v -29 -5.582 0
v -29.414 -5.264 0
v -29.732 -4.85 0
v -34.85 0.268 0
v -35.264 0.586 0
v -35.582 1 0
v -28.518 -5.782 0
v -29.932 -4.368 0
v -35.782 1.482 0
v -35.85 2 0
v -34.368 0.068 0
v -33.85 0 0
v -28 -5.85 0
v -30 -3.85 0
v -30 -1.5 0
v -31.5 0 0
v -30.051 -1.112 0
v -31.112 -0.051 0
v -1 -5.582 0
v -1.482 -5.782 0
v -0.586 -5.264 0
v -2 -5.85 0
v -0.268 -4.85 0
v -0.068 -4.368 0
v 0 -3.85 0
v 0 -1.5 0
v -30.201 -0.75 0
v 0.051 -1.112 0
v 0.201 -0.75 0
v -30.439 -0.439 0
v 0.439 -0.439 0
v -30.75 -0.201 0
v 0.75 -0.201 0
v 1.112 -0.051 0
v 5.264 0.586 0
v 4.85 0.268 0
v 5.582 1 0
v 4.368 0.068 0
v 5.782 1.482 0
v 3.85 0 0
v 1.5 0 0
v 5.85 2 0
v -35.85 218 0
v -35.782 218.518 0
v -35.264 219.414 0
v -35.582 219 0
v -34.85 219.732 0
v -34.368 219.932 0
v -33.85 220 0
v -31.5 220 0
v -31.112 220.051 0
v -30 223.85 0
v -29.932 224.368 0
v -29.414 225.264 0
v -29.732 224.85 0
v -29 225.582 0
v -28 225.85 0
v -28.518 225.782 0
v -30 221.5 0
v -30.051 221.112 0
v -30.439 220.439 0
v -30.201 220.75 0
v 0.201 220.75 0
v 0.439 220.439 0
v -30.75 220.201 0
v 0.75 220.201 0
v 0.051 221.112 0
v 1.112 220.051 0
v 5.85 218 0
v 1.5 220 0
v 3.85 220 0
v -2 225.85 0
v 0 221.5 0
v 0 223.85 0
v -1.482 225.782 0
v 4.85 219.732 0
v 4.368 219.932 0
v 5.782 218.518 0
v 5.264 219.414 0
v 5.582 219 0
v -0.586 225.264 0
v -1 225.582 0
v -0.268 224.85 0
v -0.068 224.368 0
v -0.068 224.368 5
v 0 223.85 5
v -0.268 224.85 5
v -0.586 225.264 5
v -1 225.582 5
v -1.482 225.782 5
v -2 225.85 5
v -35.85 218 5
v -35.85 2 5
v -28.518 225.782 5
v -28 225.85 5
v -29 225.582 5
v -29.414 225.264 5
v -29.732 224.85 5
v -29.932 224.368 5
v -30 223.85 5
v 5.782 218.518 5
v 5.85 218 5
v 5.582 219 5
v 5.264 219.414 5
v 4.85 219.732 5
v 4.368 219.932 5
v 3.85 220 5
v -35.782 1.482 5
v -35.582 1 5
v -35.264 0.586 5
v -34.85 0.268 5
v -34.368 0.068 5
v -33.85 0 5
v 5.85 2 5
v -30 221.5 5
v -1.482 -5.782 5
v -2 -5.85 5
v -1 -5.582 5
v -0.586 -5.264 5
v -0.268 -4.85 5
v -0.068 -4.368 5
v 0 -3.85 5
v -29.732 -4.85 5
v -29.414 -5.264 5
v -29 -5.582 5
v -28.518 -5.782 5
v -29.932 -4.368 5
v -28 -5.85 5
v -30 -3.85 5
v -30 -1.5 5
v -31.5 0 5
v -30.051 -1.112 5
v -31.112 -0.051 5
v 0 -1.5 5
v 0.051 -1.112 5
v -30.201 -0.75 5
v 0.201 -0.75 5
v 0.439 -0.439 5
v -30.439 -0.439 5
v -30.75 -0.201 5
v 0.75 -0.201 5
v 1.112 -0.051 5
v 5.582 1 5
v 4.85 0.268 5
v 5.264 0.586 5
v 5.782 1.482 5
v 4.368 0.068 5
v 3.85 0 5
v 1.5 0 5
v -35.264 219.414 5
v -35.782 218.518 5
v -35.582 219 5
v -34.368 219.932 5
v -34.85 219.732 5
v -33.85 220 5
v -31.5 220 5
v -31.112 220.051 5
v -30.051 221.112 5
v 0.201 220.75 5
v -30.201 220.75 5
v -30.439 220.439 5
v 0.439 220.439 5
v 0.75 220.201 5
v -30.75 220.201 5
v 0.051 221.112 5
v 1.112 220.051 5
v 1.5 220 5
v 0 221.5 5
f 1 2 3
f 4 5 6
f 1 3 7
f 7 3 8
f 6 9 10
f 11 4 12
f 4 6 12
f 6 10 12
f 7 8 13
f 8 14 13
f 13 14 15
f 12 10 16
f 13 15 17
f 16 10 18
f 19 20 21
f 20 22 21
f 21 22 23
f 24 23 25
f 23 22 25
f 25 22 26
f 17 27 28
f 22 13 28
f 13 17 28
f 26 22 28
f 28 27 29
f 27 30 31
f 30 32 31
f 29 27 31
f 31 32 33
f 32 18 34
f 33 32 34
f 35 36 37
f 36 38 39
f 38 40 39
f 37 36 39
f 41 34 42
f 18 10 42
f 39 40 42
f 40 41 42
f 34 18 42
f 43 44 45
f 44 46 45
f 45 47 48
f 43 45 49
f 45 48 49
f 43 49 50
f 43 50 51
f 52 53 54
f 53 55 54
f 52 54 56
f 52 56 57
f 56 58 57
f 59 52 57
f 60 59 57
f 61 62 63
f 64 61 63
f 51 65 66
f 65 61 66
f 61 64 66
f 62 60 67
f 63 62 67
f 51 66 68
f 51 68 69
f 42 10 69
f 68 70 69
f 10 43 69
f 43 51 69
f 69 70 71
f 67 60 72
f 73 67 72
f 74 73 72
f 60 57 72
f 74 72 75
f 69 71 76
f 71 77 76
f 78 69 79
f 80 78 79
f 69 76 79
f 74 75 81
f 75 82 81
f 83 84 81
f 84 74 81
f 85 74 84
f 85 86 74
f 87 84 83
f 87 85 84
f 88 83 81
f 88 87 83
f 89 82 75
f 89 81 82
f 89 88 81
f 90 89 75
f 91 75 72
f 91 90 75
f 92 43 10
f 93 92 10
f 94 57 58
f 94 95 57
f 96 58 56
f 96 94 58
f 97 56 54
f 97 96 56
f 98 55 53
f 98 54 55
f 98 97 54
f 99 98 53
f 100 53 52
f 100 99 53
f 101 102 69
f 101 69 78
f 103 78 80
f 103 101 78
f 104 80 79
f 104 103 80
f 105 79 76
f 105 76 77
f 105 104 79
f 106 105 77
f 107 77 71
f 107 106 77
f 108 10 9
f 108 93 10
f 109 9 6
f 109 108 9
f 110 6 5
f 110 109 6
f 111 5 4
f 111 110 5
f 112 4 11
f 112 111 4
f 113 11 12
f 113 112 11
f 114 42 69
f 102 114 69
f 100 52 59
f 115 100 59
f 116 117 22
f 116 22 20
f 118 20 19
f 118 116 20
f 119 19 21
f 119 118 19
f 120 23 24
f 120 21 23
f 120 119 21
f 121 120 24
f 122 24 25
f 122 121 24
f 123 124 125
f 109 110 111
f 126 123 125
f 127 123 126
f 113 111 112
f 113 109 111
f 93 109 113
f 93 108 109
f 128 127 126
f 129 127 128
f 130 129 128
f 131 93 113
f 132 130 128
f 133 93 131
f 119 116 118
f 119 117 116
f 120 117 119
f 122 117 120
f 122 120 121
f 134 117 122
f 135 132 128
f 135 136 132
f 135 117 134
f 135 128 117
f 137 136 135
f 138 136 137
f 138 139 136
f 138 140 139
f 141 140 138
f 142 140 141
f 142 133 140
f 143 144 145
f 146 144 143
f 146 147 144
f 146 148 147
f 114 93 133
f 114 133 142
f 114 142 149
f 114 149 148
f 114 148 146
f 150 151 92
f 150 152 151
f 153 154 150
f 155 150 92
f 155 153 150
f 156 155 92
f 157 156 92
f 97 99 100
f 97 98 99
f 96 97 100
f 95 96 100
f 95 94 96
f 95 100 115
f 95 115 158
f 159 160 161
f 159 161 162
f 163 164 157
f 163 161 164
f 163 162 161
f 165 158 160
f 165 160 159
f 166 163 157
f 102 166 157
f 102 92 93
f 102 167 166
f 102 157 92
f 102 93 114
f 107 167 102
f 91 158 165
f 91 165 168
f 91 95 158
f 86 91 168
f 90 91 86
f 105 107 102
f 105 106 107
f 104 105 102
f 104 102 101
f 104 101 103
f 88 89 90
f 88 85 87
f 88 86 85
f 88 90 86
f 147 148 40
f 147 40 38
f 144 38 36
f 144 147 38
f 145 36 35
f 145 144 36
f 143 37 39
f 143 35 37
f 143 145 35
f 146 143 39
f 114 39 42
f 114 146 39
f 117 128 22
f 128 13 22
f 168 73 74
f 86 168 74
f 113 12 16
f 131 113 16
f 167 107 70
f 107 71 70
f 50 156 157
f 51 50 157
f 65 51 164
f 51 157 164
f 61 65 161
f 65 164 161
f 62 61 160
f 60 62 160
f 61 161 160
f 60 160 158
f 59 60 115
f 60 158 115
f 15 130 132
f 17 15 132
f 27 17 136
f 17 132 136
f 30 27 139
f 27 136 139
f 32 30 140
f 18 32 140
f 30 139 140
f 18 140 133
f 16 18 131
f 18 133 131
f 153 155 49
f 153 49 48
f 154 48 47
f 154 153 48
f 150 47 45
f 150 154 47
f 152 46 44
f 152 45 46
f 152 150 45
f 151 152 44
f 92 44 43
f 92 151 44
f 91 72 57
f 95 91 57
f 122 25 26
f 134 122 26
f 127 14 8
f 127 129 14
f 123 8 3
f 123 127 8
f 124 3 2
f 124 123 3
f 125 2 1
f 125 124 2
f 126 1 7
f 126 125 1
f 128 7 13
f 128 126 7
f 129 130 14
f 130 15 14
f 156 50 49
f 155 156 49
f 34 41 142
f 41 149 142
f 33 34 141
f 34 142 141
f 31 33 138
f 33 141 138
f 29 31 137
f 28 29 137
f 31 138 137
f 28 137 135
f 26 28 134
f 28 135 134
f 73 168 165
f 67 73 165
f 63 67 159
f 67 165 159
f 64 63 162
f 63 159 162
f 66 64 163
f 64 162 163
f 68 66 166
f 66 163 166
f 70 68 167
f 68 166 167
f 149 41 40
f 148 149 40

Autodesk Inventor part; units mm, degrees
ref_plane "YZ Plane" through (0, 0, 0) normal (1, 0, 0) x (0, 1, 0)
ref_plane "XZ Plane" through (0, 0, 0) normal (0, 1, 0) x (-1, 0, 0)
ref_plane "XY Plane" through (0, 0, 0) normal (0, 0, 1) x (1, 0, 0)
sketch "Skizze3" plane through (0, 0, 0) normal (0, 0, 1) x (1, 0, 0)
  line L0 (0, 0) -> (-30, 0)
  line L1 (-30, 0) -> (-30, 220)
  line L2 (-30, 220) -> (0, 220)
  line L3 (0, 220) -> (0, 0)
  line L4 (-30, 220) -> (-35.85, 220)
  line L5 (-35.85, 220) -> (-35.85, 110)
  line L6 (-35.85, 110) -> (-30, 110)
  line L7 (-30, 110) -> (-30, 220)
  line L8 (-30, 220) -> (-15, 220)
  line L9 (-15, 220) -> (-15, 225.85)
  line L10 (-15, 225.85) -> (-30, 225.85)
  line L11 (-30, 225.85) -> (-30, 220)
  point P0 (-30, 110)
  point P1 (-15, 220)
  dimension "d4" = 220
  dimension "d5" = 30
  dimension "d6" = 5.85
  dimension "d8" = 5.85
extrude "Extrusion3" add sketch "Skizze3" along normal blind 5 contours L0 L1 L2 L3
extrude "Extrusion4" add sketch "Skizze3" along normal blind 5 contours L6 L5 L4 L1 | L2 L11 L10 L9
fillet "Rundung1" radius 2 2 edges at (-35.85, 220, 2.5) (-30, 225.85, 2.5)
mirror "Spiegeln1" about plane through (-15, 220, 0) normal (1, 0, 0) of "Extrusion4", "Rundung1"
mirror "Spiegeln2" about plane through (5.85, 110, 0) normal (0, -1, 0) of "Extrusion4", "Rundung1", "Spiegeln1"
fillet "Rundung2" radius 1.5 4 edges at (0, 0, 2.5) (-30, 0, 2.5) (-30, 220, 2.5) (0, 220, 2.5)
equation "\"d8\" = d6"
properties part number "BT704_trajan20_21" material "Acryl"
